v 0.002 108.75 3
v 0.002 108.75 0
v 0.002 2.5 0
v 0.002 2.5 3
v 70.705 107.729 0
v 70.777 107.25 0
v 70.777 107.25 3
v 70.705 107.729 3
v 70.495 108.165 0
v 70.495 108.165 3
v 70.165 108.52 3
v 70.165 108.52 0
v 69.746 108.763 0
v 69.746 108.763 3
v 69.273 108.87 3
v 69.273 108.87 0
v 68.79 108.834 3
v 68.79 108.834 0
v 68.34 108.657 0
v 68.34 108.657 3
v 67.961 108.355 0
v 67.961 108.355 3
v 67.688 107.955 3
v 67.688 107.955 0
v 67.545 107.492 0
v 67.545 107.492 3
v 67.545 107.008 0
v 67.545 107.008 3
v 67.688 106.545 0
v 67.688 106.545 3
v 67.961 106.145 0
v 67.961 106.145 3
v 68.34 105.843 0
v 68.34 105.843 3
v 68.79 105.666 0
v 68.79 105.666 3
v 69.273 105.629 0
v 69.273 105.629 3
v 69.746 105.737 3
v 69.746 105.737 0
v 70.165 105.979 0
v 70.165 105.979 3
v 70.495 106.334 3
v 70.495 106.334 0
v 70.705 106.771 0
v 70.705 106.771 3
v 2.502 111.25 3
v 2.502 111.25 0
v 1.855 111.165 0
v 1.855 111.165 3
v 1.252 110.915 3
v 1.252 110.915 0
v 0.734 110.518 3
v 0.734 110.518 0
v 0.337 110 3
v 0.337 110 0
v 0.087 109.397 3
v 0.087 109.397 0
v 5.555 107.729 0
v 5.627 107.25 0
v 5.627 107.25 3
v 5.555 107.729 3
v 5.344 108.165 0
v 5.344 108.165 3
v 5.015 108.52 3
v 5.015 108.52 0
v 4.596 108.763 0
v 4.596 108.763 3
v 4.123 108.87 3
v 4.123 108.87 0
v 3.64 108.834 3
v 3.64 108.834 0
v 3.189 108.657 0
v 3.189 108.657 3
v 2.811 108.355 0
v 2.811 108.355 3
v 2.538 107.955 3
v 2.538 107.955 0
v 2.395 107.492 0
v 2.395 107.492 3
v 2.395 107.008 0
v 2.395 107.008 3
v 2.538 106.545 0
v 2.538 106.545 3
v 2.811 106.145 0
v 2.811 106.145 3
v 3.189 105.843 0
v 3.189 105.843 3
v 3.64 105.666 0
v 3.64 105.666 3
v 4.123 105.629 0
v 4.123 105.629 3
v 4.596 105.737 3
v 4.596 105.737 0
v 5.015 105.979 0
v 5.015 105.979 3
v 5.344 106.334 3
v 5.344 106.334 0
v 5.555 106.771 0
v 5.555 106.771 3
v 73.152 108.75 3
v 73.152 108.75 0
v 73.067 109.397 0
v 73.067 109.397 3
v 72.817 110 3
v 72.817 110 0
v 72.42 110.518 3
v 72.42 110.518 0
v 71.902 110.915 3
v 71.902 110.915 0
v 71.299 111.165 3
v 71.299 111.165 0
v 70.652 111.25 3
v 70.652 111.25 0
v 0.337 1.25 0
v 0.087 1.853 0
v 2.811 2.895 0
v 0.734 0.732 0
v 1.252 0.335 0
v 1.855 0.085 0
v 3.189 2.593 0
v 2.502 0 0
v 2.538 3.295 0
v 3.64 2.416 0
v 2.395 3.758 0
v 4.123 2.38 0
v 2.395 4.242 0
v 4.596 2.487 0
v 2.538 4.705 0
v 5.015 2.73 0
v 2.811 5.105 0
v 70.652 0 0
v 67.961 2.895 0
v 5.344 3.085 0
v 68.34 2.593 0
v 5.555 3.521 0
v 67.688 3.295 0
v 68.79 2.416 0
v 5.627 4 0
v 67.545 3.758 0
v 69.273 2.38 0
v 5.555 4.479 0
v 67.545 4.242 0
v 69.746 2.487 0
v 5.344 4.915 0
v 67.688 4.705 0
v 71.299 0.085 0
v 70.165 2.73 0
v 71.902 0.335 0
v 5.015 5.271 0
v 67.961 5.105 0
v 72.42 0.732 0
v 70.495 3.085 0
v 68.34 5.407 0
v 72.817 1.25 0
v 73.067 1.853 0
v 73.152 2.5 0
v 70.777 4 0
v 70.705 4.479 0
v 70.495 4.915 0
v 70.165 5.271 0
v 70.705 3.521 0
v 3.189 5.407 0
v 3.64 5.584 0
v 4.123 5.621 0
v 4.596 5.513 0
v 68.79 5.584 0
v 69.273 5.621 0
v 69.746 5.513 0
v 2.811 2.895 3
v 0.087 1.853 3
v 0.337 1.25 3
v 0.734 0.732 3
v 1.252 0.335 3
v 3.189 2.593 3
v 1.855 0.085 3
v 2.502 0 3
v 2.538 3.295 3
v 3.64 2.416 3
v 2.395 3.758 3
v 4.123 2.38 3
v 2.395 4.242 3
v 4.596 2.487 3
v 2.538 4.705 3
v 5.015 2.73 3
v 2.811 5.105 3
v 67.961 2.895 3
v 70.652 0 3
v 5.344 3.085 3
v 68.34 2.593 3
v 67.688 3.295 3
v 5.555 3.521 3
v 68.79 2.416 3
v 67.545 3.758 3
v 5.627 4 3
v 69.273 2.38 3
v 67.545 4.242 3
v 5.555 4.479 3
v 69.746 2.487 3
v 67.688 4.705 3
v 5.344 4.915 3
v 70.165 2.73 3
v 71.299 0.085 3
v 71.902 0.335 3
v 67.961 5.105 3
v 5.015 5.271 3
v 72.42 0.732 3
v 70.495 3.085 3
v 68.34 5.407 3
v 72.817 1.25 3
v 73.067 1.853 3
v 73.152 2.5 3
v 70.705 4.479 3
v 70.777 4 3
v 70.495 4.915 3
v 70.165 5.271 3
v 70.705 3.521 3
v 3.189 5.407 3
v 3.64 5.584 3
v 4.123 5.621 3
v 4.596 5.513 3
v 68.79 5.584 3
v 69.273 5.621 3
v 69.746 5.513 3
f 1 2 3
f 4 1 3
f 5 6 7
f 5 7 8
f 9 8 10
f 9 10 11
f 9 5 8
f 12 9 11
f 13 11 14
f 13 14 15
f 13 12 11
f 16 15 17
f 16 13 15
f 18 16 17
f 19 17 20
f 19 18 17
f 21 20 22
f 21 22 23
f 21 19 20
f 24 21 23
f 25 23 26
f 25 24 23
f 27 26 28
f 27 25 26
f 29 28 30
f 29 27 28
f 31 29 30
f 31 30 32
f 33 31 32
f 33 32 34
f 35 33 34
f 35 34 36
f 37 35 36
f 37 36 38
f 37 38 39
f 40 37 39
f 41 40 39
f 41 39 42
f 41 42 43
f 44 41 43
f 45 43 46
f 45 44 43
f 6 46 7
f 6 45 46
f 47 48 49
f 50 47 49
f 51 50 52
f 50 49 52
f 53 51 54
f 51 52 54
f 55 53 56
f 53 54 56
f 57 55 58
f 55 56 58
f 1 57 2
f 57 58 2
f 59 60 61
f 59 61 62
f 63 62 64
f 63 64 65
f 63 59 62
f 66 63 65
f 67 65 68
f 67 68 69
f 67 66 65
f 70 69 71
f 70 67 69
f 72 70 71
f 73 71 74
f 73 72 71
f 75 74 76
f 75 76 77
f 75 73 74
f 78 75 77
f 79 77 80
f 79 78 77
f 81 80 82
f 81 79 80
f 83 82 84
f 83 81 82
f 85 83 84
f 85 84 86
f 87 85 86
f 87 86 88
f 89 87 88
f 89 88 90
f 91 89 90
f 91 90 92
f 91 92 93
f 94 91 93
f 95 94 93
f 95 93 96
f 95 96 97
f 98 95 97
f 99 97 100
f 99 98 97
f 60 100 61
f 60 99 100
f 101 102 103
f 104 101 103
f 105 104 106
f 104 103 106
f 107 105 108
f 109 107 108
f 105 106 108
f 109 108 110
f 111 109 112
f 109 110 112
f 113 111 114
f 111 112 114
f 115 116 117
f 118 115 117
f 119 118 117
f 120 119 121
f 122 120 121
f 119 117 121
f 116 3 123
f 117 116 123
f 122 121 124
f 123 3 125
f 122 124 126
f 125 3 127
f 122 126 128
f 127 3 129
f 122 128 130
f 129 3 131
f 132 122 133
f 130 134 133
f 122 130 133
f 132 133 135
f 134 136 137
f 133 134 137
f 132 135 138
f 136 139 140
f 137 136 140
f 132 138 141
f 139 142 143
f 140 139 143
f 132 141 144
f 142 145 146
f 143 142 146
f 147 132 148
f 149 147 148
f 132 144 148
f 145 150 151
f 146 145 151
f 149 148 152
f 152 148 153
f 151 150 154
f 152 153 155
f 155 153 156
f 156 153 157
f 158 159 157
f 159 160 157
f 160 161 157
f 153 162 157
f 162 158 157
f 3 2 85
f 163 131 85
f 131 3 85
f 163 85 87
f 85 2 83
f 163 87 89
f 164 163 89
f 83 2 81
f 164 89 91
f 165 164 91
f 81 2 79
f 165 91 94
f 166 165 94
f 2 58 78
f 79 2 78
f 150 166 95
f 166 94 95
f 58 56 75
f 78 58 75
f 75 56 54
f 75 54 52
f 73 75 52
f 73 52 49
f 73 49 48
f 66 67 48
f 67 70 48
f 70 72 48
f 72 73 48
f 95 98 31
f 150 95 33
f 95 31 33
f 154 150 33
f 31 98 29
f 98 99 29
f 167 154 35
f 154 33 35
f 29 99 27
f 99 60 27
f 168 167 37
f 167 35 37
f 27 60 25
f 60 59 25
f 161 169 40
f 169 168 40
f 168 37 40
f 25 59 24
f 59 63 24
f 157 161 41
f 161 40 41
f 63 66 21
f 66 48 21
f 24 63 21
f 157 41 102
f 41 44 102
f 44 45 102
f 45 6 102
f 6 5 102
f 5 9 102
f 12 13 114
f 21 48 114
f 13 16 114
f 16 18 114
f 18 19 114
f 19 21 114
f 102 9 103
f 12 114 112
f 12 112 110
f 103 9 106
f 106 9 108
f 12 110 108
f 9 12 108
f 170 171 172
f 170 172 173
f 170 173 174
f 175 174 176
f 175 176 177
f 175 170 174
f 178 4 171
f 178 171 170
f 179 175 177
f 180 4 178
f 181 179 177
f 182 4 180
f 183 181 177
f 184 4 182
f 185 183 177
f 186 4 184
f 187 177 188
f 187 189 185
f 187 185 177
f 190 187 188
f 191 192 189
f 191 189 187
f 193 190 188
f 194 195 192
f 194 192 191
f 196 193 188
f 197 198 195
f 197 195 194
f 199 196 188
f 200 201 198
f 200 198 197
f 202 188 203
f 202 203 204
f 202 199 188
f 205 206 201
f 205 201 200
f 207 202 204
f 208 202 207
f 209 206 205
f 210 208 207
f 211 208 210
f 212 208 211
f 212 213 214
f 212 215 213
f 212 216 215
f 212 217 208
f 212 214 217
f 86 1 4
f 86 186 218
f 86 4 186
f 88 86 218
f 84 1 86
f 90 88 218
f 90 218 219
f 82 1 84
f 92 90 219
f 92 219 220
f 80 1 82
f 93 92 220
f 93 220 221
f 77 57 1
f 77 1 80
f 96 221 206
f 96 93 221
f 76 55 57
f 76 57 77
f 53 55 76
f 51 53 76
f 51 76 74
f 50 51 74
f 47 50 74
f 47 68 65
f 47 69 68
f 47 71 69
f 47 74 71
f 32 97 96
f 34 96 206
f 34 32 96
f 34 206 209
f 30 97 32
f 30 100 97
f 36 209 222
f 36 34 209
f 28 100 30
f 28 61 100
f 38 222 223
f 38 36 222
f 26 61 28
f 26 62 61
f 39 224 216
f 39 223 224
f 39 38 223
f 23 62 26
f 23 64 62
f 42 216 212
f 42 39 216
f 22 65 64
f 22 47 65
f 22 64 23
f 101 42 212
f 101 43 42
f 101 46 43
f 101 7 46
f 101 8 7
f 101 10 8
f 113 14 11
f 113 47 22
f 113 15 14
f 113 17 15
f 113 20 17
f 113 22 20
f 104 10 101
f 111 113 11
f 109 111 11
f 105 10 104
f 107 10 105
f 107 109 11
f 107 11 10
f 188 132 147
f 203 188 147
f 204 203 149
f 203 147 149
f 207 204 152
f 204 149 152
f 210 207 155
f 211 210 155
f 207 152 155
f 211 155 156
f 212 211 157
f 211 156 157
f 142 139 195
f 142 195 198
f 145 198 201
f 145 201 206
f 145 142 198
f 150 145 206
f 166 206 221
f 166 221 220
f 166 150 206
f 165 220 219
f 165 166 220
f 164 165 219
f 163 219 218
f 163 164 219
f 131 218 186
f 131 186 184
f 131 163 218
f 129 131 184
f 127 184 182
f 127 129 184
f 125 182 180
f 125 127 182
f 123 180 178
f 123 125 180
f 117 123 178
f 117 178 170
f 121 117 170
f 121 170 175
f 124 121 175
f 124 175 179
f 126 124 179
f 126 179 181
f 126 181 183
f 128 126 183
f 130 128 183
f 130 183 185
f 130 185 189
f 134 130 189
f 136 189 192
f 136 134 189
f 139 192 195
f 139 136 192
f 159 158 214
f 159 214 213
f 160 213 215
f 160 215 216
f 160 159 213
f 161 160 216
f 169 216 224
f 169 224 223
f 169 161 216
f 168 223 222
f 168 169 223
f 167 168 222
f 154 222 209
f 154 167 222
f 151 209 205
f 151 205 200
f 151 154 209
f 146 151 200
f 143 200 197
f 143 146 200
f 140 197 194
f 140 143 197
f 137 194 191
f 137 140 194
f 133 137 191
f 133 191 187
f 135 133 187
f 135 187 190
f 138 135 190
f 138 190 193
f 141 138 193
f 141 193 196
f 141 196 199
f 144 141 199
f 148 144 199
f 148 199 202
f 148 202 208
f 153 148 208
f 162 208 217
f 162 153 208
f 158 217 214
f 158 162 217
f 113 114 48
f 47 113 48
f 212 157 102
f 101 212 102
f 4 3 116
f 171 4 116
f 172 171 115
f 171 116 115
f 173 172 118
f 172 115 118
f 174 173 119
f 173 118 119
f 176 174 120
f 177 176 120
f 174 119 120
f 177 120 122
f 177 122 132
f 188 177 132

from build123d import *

# Parameters (mm, degrees)
MODEL_R         = 1.625
EXTRUDE_2_DEPTH = 3


with BuildPart() as part:
    # Model → 凸台-拉伸2 (new body)
    with BuildSketch(Plane.XY):
        with BuildLine():
            Line((73.152058773, 8.000078124), (73.152058773, 108.749885124))
            ThreePointArc((73.152058773, 108.749885124), (72.419825726, 110.517652077), (70.652058773, 111.249885124))
            Line((70.652058773, 111.249885124), (8.001843373, 111.249885124))
            Line((8.001843373, 111.249885124), (2.501843373, 111.249885124))
            ThreePointArc((2.501843373, 111.249885124), (0.73407642, 110.517652077), (0.001843373, 108.749885124))
            Line((0.001843373, 108.749885124), (0.001843373, 8.000078124))
            Line((0.001843373, 8.000078124), (0.001843373, 2.500078124))
            ThreePointArc((0.001843373, 2.500078124), (0.73407642, 0.732311171), (2.501843373, 7.8124e-05))
            Line((2.501843373, 7.8124e-05), (65.152058773, 7.8124e-05))
            Line((65.152058773, 7.8124e-05), (70.652058773, 7.8124e-05))
            ThreePointArc((70.652058773, 7.8124e-05), (72.419825726, 0.732311171), (73.152058773, 2.500078124))
            Line((73.152058773, 2.500078124), (73.152058773, 8.000078124))
        make_face()
        with Locations((69.152058773, 107.249885124)):
            Circle(MODEL_R, mode=Mode.SUBTRACT)
        with Locations((4.001843373, 107.249885124)):
            Circle(MODEL_R, mode=Mode.SUBTRACT)
        with Locations((4.001843373, 4.000078124)):
            Circle(MODEL_R, mode=Mode.SUBTRACT)
        with Locations((69.152058773, 4.000078124)):
            Circle(MODEL_R, mode=Mode.SUBTRACT)
    extrude(amount=EXTRUDE_2_DEPTH)


solid = part.part
